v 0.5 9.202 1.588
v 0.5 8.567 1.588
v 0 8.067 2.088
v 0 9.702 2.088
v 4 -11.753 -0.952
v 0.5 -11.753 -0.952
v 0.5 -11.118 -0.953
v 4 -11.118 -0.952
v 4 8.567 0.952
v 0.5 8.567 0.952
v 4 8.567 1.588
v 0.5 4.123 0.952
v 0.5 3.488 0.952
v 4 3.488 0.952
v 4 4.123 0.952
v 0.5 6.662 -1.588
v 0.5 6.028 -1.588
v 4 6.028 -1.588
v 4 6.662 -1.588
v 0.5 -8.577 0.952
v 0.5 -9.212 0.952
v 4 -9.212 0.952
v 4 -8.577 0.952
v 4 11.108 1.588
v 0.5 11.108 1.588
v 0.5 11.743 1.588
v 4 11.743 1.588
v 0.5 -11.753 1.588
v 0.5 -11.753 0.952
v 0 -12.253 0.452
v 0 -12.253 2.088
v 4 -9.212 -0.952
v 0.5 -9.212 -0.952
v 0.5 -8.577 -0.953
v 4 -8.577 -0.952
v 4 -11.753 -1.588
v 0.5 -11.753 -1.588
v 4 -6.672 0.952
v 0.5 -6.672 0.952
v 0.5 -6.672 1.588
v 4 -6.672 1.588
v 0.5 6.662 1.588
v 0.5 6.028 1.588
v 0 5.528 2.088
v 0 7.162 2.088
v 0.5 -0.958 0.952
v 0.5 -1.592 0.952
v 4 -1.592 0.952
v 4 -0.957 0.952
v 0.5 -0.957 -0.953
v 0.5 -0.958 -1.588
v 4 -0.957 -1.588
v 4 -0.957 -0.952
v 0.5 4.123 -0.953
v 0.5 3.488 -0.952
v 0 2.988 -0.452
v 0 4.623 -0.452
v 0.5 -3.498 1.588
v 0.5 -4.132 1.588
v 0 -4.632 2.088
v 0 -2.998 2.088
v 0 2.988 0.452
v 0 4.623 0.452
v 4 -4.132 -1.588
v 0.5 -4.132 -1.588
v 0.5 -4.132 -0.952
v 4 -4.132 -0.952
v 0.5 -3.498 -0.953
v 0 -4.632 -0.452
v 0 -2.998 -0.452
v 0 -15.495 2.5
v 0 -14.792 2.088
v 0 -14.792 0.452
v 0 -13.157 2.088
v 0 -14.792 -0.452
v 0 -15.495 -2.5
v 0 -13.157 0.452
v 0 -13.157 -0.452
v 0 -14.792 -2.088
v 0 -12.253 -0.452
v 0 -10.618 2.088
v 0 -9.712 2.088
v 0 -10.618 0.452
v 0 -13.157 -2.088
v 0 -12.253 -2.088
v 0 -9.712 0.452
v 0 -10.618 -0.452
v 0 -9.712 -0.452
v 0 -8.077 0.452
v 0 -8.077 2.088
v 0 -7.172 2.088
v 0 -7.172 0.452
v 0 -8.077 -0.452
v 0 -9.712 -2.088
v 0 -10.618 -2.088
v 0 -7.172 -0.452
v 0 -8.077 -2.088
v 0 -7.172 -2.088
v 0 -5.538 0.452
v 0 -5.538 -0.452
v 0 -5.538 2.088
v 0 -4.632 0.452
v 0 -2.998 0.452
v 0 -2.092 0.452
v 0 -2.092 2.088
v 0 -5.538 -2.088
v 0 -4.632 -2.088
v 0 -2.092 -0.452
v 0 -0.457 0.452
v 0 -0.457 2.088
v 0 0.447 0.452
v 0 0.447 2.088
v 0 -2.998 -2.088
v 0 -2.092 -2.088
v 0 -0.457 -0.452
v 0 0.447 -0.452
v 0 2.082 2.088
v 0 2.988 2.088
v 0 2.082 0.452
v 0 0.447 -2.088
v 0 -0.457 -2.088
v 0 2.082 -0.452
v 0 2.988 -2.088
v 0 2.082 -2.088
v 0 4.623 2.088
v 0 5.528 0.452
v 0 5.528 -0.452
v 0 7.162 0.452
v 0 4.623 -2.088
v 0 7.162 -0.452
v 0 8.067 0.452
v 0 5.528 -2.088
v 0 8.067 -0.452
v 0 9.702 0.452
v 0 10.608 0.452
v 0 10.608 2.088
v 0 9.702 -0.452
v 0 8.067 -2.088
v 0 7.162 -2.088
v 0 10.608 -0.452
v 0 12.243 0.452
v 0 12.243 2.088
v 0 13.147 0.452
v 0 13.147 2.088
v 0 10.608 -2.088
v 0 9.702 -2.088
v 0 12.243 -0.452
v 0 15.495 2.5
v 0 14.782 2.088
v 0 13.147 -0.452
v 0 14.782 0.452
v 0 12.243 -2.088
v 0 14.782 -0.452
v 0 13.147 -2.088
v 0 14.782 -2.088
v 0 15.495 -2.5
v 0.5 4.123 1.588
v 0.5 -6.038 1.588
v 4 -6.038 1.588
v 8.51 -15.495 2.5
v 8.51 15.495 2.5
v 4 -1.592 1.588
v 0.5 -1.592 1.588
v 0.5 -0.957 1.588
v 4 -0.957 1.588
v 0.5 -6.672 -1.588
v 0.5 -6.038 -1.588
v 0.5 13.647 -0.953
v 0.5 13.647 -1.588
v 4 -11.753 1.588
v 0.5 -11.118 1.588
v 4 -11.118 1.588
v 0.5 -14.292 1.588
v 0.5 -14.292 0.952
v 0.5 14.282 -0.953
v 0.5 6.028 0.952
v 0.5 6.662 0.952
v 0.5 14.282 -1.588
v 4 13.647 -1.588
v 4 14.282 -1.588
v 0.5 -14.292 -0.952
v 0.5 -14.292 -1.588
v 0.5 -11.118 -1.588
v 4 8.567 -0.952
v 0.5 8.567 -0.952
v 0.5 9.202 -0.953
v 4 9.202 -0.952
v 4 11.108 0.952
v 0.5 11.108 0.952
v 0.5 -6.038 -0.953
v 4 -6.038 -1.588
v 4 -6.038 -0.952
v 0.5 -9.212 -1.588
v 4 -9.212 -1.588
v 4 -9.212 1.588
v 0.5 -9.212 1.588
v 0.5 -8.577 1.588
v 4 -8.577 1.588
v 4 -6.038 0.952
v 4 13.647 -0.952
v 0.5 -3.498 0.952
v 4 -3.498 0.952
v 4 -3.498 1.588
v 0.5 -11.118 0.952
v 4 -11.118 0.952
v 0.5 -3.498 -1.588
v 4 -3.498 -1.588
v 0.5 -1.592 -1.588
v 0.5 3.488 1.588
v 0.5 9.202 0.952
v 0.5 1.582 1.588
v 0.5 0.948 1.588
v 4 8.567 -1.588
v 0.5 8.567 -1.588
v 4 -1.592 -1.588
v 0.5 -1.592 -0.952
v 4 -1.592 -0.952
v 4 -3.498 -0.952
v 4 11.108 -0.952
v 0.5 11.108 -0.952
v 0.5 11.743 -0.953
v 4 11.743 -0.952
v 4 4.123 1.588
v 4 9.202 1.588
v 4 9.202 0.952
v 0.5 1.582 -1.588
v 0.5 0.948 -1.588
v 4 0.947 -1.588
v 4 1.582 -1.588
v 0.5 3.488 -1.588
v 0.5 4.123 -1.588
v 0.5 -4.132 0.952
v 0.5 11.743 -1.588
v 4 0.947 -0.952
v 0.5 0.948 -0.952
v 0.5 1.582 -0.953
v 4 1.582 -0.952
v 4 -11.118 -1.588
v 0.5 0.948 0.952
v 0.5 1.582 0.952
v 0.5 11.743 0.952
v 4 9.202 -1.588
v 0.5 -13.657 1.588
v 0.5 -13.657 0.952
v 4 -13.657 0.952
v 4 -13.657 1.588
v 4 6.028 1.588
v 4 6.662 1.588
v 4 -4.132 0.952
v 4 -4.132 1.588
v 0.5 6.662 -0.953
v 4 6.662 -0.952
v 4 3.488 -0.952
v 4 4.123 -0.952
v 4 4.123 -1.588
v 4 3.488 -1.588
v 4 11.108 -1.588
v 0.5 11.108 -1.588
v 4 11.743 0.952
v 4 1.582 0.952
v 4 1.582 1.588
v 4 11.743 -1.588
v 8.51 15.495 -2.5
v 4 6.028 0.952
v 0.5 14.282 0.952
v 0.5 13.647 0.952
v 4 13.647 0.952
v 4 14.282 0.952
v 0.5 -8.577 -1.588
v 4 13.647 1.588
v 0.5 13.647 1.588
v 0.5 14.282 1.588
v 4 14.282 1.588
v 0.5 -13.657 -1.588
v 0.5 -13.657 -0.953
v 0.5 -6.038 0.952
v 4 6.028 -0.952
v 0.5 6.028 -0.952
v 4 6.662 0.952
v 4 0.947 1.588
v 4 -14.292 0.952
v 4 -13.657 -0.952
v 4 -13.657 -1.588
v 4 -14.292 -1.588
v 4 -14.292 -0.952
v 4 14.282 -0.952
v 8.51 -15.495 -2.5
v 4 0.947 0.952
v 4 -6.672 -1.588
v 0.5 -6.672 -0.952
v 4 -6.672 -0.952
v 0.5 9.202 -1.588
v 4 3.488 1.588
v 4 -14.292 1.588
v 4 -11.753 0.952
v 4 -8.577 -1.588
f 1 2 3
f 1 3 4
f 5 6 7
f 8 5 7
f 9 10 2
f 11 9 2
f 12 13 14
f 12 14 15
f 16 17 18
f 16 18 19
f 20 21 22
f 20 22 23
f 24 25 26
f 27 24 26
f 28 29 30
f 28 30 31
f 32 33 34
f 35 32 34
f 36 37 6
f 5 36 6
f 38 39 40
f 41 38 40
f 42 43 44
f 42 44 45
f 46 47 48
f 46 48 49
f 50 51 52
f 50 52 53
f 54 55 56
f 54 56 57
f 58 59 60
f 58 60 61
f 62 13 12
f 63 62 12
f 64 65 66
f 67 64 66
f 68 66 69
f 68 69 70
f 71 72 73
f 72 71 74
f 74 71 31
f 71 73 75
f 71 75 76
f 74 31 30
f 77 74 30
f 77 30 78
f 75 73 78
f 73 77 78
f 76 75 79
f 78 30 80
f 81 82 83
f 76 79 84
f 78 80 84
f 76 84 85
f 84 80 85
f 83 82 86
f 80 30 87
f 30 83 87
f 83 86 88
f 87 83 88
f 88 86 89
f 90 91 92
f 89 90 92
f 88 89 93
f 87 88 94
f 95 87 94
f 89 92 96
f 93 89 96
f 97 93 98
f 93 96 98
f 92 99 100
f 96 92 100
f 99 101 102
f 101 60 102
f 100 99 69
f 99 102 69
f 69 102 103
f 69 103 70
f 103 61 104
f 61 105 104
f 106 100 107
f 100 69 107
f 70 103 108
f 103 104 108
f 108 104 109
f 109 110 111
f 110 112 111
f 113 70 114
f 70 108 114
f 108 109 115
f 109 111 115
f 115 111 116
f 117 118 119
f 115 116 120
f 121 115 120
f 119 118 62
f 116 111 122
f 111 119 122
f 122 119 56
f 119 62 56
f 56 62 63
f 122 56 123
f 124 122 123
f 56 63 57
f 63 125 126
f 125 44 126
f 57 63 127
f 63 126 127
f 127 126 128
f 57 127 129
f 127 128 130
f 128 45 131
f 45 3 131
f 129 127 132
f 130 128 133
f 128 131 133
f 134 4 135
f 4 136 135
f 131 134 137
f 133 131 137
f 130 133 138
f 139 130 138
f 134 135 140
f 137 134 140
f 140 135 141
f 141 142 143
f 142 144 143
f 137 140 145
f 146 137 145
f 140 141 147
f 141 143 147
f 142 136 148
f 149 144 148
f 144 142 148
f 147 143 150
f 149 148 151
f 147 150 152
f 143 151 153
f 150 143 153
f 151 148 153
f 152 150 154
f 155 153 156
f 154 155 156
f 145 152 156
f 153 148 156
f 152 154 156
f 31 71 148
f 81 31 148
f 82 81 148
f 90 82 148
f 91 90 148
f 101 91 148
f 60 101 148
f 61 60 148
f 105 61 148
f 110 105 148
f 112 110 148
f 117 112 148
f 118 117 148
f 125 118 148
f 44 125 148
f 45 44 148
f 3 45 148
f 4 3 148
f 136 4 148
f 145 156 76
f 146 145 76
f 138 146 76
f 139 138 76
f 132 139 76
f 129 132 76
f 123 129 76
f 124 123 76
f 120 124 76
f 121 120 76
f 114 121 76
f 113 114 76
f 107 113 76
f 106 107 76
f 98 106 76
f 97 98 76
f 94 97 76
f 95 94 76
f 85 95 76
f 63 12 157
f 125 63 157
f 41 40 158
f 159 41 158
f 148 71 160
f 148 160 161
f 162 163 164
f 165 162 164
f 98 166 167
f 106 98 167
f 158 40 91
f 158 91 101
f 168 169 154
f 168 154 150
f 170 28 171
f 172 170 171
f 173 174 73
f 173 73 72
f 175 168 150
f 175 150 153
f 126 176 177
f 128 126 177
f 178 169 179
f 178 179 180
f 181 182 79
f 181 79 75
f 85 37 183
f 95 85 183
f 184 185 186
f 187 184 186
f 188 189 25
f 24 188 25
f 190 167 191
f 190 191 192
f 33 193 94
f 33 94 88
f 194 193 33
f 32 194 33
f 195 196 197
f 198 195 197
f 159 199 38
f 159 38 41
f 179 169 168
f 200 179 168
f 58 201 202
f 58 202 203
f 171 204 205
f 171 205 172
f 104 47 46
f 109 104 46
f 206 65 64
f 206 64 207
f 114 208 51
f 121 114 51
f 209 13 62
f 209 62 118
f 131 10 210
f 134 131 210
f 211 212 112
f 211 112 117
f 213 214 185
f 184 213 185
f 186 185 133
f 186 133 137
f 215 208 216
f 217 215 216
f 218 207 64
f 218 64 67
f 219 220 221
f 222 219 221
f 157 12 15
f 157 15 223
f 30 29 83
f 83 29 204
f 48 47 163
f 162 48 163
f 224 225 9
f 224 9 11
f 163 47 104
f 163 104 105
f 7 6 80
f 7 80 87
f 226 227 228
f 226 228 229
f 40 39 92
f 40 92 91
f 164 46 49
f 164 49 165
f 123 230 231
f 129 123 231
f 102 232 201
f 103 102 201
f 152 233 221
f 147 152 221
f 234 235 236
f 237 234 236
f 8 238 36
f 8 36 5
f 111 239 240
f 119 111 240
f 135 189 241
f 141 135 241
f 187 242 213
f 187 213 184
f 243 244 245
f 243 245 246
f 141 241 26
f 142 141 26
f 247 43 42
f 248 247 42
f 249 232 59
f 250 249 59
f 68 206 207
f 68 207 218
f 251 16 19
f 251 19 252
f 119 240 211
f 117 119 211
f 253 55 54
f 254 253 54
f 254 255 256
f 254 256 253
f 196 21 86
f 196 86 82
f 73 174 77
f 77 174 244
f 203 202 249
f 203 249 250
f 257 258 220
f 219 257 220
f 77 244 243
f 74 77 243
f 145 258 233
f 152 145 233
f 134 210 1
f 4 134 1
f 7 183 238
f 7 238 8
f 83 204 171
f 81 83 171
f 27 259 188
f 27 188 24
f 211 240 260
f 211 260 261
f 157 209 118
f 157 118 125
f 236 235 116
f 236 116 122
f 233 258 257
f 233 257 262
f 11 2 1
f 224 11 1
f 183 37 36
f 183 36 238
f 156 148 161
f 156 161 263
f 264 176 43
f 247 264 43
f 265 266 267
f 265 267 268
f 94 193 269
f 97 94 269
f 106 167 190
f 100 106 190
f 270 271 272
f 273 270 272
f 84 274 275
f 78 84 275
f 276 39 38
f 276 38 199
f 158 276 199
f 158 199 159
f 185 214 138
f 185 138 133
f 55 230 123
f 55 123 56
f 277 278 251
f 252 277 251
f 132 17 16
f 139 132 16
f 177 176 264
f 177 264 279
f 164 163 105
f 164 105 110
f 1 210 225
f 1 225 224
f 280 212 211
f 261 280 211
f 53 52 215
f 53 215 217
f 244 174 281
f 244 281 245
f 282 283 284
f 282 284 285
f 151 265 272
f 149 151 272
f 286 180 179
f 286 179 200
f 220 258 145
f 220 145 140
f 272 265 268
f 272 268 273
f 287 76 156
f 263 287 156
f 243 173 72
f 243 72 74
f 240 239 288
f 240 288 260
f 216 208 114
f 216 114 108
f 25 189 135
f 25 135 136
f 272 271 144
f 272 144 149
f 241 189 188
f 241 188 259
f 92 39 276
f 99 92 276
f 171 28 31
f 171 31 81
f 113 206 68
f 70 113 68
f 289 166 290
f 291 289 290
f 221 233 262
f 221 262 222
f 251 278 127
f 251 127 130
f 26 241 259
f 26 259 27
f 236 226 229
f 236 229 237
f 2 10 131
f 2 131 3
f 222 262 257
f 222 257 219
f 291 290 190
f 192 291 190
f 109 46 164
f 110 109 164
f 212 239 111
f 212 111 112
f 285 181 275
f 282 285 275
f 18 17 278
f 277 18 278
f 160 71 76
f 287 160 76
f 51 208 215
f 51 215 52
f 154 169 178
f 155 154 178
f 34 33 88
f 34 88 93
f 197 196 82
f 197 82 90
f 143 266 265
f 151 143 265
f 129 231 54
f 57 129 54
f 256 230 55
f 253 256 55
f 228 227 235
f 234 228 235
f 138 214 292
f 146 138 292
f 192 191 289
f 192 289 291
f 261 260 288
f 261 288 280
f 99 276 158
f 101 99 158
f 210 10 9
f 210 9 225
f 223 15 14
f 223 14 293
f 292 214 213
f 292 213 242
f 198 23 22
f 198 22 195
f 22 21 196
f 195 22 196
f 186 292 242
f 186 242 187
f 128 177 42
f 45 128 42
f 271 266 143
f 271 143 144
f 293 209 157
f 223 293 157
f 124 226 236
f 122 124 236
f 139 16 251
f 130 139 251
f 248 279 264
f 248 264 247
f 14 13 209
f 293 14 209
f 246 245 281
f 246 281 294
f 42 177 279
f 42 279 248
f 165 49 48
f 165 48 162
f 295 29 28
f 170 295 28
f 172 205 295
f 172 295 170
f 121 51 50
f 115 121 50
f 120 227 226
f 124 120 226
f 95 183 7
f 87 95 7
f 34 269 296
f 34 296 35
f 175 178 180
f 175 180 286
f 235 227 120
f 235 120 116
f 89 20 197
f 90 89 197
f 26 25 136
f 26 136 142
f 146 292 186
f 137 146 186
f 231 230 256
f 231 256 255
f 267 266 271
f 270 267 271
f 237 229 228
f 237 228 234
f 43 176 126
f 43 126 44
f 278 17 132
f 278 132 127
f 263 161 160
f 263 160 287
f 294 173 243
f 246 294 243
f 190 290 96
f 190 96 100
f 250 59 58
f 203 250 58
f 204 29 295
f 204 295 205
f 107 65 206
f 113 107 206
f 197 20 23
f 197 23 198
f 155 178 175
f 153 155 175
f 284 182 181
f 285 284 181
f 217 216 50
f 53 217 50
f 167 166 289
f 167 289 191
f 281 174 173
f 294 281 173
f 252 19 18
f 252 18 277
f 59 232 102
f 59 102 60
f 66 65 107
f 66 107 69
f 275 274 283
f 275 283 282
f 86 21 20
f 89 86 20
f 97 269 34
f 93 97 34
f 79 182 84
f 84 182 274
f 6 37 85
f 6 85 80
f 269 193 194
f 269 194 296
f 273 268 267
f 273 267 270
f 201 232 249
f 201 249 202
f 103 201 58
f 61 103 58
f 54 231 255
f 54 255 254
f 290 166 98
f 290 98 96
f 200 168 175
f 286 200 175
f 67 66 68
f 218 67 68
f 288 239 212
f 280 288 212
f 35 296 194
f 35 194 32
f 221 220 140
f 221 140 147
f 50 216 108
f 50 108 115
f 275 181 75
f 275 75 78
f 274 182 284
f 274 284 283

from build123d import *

# Parameters (mm, degrees)
SKETCH2_W           = 5
SKETCH2_H           = 30.99
BOSS_EXTRUDE1_DEPTH = 8.51
SKETCH3_W           = 0.635
SKETCH3_H           = 0.635
CUT_EXTRUDE1_DEPTH  = 4
CHAMFER2_SIZE       = 0.5


with BuildPart() as part:
    # Sketch2 → Boss-Extrude1 (new body)
    with BuildSketch(Plane(origin=(0, 0, 0), x_dir=(0, 0, -1), z_dir=(1, 0, 0))):
        Rectangle(SKETCH2_W, SKETCH2_H)
    extrude(amount=BOSS_EXTRUDE1_DEPTH)

    # Sketch3 → Cut-Extrude1 (cut)
    with BuildSketch(Plane.ZY):
        with Locations((-1.27, 13.965)):
            Rectangle(SKETCH3_W, SKETCH3_H)
        with Locations((1.27, 13.965)):
            Rectangle(SKETCH3_W, SKETCH3_H)
        with Locations((1.27, 11.425)):
            Rectangle(SKETCH3_W, SKETCH3_H)
        with Locations((1.27, 8.885)):
            Rectangle(SKETCH3_W, SKETCH3_H)
        with Locations((1.27, 6.345)):
            Rectangle(SKETCH3_W, SKETCH3_H)
        with Locations((1.27, 3.805)):
            Rectangle(SKETCH3_W, SKETCH3_H)
        with Locations((1.27, 1.265)):
            Rectangle(SKETCH3_W, SKETCH3_H)
        with Locations((1.27, -1.275)):
            Rectangle(SKETCH3_W, SKETCH3_H)
        with Locations((1.27, -3.815)):
            Rectangle(SKETCH3_W, SKETCH3_H)
        with Locations((1.27, -6.355)):
            Rectangle(SKETCH3_W, SKETCH3_H)
        with Locations((1.27, -8.895)):
            Rectangle(SKETCH3_W, SKETCH3_H)
        with Locations((1.27, -11.435)):
            Rectangle(SKETCH3_W, SKETCH3_H)
        with Locations((1.27, -13.975)):
            Rectangle(SKETCH3_W, SKETCH3_H)
        with Locations((-1.27, 11.425)):
            Rectangle(SKETCH3_W, SKETCH3_H)
        with Locations((-1.27, 8.885)):
            Rectangle(SKETCH3_W, SKETCH3_H)
        with Locations((-1.27, 6.345)):
            Rectangle(SKETCH3_W, SKETCH3_H)
        with Locations((-1.27, 3.805)):
            Rectangle(SKETCH3_W, SKETCH3_H)
        with Locations((-1.27, 1.265)):
            Rectangle(SKETCH3_W, SKETCH3_H)
        with Locations((-1.27, -1.275)):
            Rectangle(SKETCH3_W, SKETCH3_H)
        with Locations((-1.27, -3.815)):
            Rectangle(SKETCH3_W, SKETCH3_H)
        with Locations((-1.27, -6.355)):
            Rectangle(SKETCH3_W, SKETCH3_H)
        with Locations((-1.27, -8.895)):
            Rectangle(SKETCH3_W, SKETCH3_H)
        with Locations((-1.27, -11.435)):
            Rectangle(SKETCH3_W, SKETCH3_H)
        with Locations((-1.27, -13.975)):
            Rectangle(SKETCH3_W, SKETCH3_H)
    extrude(amount=-CUT_EXTRUDE1_DEPTH, mode=Mode.SUBTRACT)

    # Chamfer2
    chamfer2_edges = [part.edges().sort_by_distance(p)[0] for p in [
        (0, -6.6725, 1.27),
        (0, -6.355, 1.5875),
        (0, -6.0375, 1.27),
        (0, -6.355, 0.9525),
        (0, -4.1325, 1.27),
        (0, -3.815, 1.5875),
        (0, -3.4975, 1.27),
        (0, -3.815, 0.9525),
        (0, -1.5925, 1.27),
        (0, -1.275, 1.5875),
        (0, -0.9575, 1.27),
        (0, -1.275, 0.9525),
        (0, 0.9475, 1.27),
        (0, 1.265, 1.5875),
        (0, 1.5825, 1.27),
        (0, 1.265, 0.9525),
        (0, 3.4875, 1.27),
        (0, 3.805, 1.5875),
        (0, 4.1225, 1.27),
        (0, 3.805, 0.9525),
        (0, 6.0275, 1.27),
        (0, 6.345, 1.5875),
        (0, 6.6625, 1.27),
        (0, 6.345, 0.9525),
        (0, 8.5675, 1.27),
        (0, 8.885, 1.5875),
        (0, 9.2025, 1.27),
        (0, 8.885, 0.9525),
        (0, 11.1075, 1.27),
        (0, 11.425, 1.5875),
        (0, 11.7425, 1.27),
        (0, 11.425, 0.9525),
        (0, 13.6475, 1.27),
        (0, 13.965, 1.5875),
        (0, 14.2825, 1.27),
        (0, 13.965, 0.9525),
        (0, 0.9475, -1.27),
        (0, 1.265, -0.9525),
        (0, 1.5825, -1.27),
        (0, 1.265, -1.5875),
        (0, -1.5925, -1.27),
        (0, -1.275, -0.9525),
        (0, -0.9575, -1.27),
        (0, -1.275, -1.5875),
        (0, -4.1325, -1.27),
        (0, -3.815, -0.9525),
        (0, -3.4975, -1.27),
        (0, -3.815, -1.5875),
        (0, -6.6725, -1.27),
        (0, -6.355, -0.9525),
        (0, -6.0375, -1.27),
        (0, -6.355, -1.5875),
        (0, -9.2125, -1.27),
        (0, -8.895, -0.9525),
        (0, -8.5775, -1.27),
        (0, -8.895, -1.5875),
        (0, -11.7525, -1.27),
        (0, -11.435, -0.9525),
        (0, -11.1175, -1.27),
        (0, -11.435, -1.5875),
        (0, -14.2925, -1.27),
        (0, -13.975, -0.9525),
        (0, -13.6575, -1.27),
        (0, -13.975, -1.5875),
        (0, 13.965, -0.9525),
        (0, 14.2825, -1.27),
        (0, 13.965, -1.5875),
        (0, 13.6475, -1.27),
        (0, 3.4875, -1.27),
        (0, 3.805, -0.9525),
        (0, 4.1225, -1.27),
        (0, 3.805, -1.5875),
        (0, 6.0275, -1.27),
        (0, 6.345, -0.9525),
        (0, 6.6625, -1.27),
        (0, 6.345, -1.5875),
        (0, 8.5675, -1.27),
        (0, 8.885, -0.9525),
        (0, 9.2025, -1.27),
        (0, 8.885, -1.5875),
        (0, 11.1075, -1.27),
        (0, 11.425, -0.9525),
        (0, 11.7425, -1.27),
        (0, 11.425, -1.5875),
        (0, -14.2925, 1.27),
        (0, -13.975, 1.5875),
        (0, -13.6575, 1.27),
        (0, -13.975, 0.9525),
        (0, -11.7525, 1.27),
        (0, -11.435, 1.5875),
        (0, -11.1175, 1.27),
        (0, -11.435, 0.9525),
        (0, -9.2125, 1.27),
        (0, -8.895, 1.5875),
        (0, -8.5775, 1.27),
        (0, -8.895, 0.9525),
    ]]
    chamfer(chamfer2_edges, length=CHAMFER2_SIZE)


solid = part.part
